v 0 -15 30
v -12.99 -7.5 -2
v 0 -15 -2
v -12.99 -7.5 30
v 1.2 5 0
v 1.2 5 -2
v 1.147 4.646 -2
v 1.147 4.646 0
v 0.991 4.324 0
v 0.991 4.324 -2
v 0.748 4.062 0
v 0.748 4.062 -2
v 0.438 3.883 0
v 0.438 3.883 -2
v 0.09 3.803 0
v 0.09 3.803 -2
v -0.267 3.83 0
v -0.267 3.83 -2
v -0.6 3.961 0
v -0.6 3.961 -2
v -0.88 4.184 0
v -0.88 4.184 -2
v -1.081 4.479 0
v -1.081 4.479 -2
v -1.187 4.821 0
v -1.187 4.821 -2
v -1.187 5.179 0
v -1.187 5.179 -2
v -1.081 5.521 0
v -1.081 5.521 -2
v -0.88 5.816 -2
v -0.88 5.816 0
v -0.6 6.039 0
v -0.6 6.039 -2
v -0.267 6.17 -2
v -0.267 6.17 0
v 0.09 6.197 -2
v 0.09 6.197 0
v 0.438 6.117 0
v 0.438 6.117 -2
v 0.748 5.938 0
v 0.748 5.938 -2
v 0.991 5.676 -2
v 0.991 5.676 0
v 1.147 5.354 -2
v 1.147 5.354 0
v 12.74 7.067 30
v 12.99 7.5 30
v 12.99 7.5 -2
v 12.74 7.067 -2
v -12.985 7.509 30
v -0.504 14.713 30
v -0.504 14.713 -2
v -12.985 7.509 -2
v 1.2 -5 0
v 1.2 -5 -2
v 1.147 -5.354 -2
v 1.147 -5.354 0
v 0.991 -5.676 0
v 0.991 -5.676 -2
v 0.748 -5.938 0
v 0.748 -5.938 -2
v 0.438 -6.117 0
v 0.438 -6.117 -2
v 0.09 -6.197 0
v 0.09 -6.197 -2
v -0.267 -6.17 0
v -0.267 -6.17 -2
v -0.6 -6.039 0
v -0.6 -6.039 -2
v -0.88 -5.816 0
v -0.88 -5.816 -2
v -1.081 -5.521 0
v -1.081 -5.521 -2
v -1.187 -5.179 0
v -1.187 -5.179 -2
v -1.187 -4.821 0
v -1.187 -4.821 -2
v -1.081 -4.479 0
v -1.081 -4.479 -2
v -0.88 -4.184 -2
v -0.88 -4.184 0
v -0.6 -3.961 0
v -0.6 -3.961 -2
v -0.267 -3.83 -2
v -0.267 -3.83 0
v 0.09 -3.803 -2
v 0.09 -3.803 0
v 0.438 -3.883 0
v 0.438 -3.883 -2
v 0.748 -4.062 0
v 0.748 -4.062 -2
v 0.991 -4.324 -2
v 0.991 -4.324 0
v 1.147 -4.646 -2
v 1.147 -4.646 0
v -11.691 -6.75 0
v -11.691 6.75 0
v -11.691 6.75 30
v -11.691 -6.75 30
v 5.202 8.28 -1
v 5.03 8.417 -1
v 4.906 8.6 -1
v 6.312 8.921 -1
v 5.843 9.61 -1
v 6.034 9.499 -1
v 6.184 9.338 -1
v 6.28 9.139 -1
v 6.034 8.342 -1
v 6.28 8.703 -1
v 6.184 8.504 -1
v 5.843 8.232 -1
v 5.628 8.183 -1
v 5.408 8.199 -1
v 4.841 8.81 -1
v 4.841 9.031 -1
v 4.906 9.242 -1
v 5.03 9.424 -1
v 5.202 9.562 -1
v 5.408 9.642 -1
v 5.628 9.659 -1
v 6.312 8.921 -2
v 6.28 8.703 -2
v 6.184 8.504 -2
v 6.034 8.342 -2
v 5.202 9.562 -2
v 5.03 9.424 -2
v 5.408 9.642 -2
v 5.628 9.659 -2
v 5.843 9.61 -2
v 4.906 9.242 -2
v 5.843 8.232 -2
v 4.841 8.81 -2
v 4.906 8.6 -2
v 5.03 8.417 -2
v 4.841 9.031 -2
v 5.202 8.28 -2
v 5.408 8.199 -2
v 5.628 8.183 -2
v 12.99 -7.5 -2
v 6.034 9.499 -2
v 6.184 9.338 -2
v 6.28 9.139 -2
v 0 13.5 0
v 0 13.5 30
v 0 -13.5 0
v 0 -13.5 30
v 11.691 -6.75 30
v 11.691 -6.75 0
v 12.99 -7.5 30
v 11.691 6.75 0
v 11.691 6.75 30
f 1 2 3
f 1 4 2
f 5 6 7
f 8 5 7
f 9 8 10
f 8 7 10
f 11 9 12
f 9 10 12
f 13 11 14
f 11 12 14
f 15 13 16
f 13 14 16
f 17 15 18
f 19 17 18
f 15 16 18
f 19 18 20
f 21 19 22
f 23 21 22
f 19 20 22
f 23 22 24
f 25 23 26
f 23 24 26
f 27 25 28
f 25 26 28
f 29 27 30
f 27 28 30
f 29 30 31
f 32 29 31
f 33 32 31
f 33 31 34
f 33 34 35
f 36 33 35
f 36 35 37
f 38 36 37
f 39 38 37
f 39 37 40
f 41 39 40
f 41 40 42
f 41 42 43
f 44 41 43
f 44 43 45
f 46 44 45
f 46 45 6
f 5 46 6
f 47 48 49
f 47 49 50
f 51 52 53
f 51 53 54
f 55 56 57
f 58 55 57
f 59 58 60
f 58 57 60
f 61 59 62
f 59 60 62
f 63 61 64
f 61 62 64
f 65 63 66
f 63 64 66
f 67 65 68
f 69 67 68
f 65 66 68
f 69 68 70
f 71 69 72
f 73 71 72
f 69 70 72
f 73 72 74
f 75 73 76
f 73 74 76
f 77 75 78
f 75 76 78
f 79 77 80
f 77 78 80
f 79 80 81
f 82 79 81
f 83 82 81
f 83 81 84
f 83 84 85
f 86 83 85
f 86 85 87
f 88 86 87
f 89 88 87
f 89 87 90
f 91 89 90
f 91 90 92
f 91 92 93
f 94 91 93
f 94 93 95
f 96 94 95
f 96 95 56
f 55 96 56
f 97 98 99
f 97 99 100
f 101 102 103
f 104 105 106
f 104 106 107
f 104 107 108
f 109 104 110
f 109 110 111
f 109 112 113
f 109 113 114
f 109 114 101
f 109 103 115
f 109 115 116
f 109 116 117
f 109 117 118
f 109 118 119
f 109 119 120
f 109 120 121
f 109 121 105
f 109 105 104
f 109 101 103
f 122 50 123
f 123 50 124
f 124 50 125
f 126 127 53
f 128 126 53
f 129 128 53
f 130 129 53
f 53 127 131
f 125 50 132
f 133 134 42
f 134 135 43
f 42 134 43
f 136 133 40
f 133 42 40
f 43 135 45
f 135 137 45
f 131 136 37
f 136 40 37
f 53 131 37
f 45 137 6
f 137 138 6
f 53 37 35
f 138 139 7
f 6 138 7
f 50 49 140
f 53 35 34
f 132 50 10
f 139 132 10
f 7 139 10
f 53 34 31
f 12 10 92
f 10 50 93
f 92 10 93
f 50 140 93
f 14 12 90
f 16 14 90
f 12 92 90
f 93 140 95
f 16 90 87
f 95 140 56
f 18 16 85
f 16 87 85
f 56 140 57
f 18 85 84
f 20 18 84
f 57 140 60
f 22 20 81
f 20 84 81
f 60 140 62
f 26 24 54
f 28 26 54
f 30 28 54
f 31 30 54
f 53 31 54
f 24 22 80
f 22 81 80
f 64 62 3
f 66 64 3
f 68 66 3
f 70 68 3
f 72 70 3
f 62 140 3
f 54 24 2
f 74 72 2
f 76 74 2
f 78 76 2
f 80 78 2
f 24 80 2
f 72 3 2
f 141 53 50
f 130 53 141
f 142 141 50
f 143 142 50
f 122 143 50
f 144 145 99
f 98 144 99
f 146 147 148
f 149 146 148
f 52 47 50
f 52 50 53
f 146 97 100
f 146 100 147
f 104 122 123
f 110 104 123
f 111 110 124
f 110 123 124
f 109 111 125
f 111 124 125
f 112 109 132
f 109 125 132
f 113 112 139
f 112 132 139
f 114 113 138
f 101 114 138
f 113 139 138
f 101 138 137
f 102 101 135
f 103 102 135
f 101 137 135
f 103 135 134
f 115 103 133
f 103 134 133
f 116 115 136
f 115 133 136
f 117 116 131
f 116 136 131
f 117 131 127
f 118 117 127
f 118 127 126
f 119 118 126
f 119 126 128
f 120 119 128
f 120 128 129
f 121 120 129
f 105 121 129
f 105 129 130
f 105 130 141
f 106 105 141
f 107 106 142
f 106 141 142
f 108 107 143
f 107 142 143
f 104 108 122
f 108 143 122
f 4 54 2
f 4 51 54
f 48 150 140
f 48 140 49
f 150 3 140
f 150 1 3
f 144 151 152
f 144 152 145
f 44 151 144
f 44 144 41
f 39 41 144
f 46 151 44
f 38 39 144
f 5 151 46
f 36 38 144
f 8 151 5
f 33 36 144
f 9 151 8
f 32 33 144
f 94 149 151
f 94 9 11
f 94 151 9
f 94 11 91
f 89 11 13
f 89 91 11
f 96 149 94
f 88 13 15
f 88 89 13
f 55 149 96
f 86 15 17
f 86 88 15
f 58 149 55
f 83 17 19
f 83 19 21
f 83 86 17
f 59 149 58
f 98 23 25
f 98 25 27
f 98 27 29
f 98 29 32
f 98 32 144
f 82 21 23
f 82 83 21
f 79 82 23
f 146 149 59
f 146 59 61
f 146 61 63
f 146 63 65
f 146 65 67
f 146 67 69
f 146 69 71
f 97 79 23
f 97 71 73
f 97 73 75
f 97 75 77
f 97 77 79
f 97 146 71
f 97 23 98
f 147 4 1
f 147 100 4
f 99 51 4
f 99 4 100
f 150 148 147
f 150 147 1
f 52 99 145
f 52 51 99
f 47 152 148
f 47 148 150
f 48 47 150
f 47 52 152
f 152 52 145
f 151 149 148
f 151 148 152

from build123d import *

# Parameters (mm, degrees)
PAD_DEPTH       = 30
PAD001_DEPTH    = 2
SKETCH002_R     = 0.739951
POCKET_DEPTH    = 1
SKETCH003_R     = 1.2
POCKET001_DEPTH = 5


with BuildPart() as part:
    # Sketch → Pad (new body)
    with BuildSketch(Plane.XY):
        Polygon((-0.50397, 14.713397), (-12.984903, 7.508821), (-12.99, -7.5), (0, -14.99967), (12.99, -7.5), (12.99, 7.5), (12.74, 7.066987), align=None)
        Polygon((0, 13.49967), (-11.691057, 6.749835), (-11.691057, -6.749835), (0, -13.49967), (11.691057, -6.749835), (11.691057, 6.749835), align=None, mode=Mode.SUBTRACT)
    extrude(amount=PAD_DEPTH)

    # Sketch001 (on Face14 of Pad) → Pad001 (join)
    with BuildSketch(Plane(origin=(0, 0, 0), x_dir=(1, 0, 0), z_dir=(0, 0, -1))):
        Polygon((0, 14.99967), (12.99, 7.5), (12.99, -7.5), (12.74, -7.066987), (-0.50397, -14.713397), (-12.984903, -7.508821), (-12.99, 7.5), align=None)
    extrude(amount=PAD001_DEPTH)

    # Sketch002 (on Face10 of Pad001) → Pocket (cut)
    with BuildSketch(Plane(origin=(0, 0, -2), x_dir=(1, 0, 0), z_dir=(0, 0, -1))):
        with Locations((5.572448, -8.92072)):
            Circle(SKETCH002_R)
    extrude(amount=-POCKET_DEPTH, mode=Mode.SUBTRACT)

    # Sketch003 (on Face10 of Pocket) → Pocket001 (cut)
    with BuildSketch(Plane(origin=(0, 0, -2), x_dir=(1, 0, 0), z_dir=(0, 0, -1))):
        with Locations((0, 5)):
            Circle(SKETCH003_R)
        with Locations((0, -5)):
            Circle(SKETCH003_R)
    extrude(amount=-POCKET001_DEPTH, mode=Mode.SUBTRACT)


solid = part.part
